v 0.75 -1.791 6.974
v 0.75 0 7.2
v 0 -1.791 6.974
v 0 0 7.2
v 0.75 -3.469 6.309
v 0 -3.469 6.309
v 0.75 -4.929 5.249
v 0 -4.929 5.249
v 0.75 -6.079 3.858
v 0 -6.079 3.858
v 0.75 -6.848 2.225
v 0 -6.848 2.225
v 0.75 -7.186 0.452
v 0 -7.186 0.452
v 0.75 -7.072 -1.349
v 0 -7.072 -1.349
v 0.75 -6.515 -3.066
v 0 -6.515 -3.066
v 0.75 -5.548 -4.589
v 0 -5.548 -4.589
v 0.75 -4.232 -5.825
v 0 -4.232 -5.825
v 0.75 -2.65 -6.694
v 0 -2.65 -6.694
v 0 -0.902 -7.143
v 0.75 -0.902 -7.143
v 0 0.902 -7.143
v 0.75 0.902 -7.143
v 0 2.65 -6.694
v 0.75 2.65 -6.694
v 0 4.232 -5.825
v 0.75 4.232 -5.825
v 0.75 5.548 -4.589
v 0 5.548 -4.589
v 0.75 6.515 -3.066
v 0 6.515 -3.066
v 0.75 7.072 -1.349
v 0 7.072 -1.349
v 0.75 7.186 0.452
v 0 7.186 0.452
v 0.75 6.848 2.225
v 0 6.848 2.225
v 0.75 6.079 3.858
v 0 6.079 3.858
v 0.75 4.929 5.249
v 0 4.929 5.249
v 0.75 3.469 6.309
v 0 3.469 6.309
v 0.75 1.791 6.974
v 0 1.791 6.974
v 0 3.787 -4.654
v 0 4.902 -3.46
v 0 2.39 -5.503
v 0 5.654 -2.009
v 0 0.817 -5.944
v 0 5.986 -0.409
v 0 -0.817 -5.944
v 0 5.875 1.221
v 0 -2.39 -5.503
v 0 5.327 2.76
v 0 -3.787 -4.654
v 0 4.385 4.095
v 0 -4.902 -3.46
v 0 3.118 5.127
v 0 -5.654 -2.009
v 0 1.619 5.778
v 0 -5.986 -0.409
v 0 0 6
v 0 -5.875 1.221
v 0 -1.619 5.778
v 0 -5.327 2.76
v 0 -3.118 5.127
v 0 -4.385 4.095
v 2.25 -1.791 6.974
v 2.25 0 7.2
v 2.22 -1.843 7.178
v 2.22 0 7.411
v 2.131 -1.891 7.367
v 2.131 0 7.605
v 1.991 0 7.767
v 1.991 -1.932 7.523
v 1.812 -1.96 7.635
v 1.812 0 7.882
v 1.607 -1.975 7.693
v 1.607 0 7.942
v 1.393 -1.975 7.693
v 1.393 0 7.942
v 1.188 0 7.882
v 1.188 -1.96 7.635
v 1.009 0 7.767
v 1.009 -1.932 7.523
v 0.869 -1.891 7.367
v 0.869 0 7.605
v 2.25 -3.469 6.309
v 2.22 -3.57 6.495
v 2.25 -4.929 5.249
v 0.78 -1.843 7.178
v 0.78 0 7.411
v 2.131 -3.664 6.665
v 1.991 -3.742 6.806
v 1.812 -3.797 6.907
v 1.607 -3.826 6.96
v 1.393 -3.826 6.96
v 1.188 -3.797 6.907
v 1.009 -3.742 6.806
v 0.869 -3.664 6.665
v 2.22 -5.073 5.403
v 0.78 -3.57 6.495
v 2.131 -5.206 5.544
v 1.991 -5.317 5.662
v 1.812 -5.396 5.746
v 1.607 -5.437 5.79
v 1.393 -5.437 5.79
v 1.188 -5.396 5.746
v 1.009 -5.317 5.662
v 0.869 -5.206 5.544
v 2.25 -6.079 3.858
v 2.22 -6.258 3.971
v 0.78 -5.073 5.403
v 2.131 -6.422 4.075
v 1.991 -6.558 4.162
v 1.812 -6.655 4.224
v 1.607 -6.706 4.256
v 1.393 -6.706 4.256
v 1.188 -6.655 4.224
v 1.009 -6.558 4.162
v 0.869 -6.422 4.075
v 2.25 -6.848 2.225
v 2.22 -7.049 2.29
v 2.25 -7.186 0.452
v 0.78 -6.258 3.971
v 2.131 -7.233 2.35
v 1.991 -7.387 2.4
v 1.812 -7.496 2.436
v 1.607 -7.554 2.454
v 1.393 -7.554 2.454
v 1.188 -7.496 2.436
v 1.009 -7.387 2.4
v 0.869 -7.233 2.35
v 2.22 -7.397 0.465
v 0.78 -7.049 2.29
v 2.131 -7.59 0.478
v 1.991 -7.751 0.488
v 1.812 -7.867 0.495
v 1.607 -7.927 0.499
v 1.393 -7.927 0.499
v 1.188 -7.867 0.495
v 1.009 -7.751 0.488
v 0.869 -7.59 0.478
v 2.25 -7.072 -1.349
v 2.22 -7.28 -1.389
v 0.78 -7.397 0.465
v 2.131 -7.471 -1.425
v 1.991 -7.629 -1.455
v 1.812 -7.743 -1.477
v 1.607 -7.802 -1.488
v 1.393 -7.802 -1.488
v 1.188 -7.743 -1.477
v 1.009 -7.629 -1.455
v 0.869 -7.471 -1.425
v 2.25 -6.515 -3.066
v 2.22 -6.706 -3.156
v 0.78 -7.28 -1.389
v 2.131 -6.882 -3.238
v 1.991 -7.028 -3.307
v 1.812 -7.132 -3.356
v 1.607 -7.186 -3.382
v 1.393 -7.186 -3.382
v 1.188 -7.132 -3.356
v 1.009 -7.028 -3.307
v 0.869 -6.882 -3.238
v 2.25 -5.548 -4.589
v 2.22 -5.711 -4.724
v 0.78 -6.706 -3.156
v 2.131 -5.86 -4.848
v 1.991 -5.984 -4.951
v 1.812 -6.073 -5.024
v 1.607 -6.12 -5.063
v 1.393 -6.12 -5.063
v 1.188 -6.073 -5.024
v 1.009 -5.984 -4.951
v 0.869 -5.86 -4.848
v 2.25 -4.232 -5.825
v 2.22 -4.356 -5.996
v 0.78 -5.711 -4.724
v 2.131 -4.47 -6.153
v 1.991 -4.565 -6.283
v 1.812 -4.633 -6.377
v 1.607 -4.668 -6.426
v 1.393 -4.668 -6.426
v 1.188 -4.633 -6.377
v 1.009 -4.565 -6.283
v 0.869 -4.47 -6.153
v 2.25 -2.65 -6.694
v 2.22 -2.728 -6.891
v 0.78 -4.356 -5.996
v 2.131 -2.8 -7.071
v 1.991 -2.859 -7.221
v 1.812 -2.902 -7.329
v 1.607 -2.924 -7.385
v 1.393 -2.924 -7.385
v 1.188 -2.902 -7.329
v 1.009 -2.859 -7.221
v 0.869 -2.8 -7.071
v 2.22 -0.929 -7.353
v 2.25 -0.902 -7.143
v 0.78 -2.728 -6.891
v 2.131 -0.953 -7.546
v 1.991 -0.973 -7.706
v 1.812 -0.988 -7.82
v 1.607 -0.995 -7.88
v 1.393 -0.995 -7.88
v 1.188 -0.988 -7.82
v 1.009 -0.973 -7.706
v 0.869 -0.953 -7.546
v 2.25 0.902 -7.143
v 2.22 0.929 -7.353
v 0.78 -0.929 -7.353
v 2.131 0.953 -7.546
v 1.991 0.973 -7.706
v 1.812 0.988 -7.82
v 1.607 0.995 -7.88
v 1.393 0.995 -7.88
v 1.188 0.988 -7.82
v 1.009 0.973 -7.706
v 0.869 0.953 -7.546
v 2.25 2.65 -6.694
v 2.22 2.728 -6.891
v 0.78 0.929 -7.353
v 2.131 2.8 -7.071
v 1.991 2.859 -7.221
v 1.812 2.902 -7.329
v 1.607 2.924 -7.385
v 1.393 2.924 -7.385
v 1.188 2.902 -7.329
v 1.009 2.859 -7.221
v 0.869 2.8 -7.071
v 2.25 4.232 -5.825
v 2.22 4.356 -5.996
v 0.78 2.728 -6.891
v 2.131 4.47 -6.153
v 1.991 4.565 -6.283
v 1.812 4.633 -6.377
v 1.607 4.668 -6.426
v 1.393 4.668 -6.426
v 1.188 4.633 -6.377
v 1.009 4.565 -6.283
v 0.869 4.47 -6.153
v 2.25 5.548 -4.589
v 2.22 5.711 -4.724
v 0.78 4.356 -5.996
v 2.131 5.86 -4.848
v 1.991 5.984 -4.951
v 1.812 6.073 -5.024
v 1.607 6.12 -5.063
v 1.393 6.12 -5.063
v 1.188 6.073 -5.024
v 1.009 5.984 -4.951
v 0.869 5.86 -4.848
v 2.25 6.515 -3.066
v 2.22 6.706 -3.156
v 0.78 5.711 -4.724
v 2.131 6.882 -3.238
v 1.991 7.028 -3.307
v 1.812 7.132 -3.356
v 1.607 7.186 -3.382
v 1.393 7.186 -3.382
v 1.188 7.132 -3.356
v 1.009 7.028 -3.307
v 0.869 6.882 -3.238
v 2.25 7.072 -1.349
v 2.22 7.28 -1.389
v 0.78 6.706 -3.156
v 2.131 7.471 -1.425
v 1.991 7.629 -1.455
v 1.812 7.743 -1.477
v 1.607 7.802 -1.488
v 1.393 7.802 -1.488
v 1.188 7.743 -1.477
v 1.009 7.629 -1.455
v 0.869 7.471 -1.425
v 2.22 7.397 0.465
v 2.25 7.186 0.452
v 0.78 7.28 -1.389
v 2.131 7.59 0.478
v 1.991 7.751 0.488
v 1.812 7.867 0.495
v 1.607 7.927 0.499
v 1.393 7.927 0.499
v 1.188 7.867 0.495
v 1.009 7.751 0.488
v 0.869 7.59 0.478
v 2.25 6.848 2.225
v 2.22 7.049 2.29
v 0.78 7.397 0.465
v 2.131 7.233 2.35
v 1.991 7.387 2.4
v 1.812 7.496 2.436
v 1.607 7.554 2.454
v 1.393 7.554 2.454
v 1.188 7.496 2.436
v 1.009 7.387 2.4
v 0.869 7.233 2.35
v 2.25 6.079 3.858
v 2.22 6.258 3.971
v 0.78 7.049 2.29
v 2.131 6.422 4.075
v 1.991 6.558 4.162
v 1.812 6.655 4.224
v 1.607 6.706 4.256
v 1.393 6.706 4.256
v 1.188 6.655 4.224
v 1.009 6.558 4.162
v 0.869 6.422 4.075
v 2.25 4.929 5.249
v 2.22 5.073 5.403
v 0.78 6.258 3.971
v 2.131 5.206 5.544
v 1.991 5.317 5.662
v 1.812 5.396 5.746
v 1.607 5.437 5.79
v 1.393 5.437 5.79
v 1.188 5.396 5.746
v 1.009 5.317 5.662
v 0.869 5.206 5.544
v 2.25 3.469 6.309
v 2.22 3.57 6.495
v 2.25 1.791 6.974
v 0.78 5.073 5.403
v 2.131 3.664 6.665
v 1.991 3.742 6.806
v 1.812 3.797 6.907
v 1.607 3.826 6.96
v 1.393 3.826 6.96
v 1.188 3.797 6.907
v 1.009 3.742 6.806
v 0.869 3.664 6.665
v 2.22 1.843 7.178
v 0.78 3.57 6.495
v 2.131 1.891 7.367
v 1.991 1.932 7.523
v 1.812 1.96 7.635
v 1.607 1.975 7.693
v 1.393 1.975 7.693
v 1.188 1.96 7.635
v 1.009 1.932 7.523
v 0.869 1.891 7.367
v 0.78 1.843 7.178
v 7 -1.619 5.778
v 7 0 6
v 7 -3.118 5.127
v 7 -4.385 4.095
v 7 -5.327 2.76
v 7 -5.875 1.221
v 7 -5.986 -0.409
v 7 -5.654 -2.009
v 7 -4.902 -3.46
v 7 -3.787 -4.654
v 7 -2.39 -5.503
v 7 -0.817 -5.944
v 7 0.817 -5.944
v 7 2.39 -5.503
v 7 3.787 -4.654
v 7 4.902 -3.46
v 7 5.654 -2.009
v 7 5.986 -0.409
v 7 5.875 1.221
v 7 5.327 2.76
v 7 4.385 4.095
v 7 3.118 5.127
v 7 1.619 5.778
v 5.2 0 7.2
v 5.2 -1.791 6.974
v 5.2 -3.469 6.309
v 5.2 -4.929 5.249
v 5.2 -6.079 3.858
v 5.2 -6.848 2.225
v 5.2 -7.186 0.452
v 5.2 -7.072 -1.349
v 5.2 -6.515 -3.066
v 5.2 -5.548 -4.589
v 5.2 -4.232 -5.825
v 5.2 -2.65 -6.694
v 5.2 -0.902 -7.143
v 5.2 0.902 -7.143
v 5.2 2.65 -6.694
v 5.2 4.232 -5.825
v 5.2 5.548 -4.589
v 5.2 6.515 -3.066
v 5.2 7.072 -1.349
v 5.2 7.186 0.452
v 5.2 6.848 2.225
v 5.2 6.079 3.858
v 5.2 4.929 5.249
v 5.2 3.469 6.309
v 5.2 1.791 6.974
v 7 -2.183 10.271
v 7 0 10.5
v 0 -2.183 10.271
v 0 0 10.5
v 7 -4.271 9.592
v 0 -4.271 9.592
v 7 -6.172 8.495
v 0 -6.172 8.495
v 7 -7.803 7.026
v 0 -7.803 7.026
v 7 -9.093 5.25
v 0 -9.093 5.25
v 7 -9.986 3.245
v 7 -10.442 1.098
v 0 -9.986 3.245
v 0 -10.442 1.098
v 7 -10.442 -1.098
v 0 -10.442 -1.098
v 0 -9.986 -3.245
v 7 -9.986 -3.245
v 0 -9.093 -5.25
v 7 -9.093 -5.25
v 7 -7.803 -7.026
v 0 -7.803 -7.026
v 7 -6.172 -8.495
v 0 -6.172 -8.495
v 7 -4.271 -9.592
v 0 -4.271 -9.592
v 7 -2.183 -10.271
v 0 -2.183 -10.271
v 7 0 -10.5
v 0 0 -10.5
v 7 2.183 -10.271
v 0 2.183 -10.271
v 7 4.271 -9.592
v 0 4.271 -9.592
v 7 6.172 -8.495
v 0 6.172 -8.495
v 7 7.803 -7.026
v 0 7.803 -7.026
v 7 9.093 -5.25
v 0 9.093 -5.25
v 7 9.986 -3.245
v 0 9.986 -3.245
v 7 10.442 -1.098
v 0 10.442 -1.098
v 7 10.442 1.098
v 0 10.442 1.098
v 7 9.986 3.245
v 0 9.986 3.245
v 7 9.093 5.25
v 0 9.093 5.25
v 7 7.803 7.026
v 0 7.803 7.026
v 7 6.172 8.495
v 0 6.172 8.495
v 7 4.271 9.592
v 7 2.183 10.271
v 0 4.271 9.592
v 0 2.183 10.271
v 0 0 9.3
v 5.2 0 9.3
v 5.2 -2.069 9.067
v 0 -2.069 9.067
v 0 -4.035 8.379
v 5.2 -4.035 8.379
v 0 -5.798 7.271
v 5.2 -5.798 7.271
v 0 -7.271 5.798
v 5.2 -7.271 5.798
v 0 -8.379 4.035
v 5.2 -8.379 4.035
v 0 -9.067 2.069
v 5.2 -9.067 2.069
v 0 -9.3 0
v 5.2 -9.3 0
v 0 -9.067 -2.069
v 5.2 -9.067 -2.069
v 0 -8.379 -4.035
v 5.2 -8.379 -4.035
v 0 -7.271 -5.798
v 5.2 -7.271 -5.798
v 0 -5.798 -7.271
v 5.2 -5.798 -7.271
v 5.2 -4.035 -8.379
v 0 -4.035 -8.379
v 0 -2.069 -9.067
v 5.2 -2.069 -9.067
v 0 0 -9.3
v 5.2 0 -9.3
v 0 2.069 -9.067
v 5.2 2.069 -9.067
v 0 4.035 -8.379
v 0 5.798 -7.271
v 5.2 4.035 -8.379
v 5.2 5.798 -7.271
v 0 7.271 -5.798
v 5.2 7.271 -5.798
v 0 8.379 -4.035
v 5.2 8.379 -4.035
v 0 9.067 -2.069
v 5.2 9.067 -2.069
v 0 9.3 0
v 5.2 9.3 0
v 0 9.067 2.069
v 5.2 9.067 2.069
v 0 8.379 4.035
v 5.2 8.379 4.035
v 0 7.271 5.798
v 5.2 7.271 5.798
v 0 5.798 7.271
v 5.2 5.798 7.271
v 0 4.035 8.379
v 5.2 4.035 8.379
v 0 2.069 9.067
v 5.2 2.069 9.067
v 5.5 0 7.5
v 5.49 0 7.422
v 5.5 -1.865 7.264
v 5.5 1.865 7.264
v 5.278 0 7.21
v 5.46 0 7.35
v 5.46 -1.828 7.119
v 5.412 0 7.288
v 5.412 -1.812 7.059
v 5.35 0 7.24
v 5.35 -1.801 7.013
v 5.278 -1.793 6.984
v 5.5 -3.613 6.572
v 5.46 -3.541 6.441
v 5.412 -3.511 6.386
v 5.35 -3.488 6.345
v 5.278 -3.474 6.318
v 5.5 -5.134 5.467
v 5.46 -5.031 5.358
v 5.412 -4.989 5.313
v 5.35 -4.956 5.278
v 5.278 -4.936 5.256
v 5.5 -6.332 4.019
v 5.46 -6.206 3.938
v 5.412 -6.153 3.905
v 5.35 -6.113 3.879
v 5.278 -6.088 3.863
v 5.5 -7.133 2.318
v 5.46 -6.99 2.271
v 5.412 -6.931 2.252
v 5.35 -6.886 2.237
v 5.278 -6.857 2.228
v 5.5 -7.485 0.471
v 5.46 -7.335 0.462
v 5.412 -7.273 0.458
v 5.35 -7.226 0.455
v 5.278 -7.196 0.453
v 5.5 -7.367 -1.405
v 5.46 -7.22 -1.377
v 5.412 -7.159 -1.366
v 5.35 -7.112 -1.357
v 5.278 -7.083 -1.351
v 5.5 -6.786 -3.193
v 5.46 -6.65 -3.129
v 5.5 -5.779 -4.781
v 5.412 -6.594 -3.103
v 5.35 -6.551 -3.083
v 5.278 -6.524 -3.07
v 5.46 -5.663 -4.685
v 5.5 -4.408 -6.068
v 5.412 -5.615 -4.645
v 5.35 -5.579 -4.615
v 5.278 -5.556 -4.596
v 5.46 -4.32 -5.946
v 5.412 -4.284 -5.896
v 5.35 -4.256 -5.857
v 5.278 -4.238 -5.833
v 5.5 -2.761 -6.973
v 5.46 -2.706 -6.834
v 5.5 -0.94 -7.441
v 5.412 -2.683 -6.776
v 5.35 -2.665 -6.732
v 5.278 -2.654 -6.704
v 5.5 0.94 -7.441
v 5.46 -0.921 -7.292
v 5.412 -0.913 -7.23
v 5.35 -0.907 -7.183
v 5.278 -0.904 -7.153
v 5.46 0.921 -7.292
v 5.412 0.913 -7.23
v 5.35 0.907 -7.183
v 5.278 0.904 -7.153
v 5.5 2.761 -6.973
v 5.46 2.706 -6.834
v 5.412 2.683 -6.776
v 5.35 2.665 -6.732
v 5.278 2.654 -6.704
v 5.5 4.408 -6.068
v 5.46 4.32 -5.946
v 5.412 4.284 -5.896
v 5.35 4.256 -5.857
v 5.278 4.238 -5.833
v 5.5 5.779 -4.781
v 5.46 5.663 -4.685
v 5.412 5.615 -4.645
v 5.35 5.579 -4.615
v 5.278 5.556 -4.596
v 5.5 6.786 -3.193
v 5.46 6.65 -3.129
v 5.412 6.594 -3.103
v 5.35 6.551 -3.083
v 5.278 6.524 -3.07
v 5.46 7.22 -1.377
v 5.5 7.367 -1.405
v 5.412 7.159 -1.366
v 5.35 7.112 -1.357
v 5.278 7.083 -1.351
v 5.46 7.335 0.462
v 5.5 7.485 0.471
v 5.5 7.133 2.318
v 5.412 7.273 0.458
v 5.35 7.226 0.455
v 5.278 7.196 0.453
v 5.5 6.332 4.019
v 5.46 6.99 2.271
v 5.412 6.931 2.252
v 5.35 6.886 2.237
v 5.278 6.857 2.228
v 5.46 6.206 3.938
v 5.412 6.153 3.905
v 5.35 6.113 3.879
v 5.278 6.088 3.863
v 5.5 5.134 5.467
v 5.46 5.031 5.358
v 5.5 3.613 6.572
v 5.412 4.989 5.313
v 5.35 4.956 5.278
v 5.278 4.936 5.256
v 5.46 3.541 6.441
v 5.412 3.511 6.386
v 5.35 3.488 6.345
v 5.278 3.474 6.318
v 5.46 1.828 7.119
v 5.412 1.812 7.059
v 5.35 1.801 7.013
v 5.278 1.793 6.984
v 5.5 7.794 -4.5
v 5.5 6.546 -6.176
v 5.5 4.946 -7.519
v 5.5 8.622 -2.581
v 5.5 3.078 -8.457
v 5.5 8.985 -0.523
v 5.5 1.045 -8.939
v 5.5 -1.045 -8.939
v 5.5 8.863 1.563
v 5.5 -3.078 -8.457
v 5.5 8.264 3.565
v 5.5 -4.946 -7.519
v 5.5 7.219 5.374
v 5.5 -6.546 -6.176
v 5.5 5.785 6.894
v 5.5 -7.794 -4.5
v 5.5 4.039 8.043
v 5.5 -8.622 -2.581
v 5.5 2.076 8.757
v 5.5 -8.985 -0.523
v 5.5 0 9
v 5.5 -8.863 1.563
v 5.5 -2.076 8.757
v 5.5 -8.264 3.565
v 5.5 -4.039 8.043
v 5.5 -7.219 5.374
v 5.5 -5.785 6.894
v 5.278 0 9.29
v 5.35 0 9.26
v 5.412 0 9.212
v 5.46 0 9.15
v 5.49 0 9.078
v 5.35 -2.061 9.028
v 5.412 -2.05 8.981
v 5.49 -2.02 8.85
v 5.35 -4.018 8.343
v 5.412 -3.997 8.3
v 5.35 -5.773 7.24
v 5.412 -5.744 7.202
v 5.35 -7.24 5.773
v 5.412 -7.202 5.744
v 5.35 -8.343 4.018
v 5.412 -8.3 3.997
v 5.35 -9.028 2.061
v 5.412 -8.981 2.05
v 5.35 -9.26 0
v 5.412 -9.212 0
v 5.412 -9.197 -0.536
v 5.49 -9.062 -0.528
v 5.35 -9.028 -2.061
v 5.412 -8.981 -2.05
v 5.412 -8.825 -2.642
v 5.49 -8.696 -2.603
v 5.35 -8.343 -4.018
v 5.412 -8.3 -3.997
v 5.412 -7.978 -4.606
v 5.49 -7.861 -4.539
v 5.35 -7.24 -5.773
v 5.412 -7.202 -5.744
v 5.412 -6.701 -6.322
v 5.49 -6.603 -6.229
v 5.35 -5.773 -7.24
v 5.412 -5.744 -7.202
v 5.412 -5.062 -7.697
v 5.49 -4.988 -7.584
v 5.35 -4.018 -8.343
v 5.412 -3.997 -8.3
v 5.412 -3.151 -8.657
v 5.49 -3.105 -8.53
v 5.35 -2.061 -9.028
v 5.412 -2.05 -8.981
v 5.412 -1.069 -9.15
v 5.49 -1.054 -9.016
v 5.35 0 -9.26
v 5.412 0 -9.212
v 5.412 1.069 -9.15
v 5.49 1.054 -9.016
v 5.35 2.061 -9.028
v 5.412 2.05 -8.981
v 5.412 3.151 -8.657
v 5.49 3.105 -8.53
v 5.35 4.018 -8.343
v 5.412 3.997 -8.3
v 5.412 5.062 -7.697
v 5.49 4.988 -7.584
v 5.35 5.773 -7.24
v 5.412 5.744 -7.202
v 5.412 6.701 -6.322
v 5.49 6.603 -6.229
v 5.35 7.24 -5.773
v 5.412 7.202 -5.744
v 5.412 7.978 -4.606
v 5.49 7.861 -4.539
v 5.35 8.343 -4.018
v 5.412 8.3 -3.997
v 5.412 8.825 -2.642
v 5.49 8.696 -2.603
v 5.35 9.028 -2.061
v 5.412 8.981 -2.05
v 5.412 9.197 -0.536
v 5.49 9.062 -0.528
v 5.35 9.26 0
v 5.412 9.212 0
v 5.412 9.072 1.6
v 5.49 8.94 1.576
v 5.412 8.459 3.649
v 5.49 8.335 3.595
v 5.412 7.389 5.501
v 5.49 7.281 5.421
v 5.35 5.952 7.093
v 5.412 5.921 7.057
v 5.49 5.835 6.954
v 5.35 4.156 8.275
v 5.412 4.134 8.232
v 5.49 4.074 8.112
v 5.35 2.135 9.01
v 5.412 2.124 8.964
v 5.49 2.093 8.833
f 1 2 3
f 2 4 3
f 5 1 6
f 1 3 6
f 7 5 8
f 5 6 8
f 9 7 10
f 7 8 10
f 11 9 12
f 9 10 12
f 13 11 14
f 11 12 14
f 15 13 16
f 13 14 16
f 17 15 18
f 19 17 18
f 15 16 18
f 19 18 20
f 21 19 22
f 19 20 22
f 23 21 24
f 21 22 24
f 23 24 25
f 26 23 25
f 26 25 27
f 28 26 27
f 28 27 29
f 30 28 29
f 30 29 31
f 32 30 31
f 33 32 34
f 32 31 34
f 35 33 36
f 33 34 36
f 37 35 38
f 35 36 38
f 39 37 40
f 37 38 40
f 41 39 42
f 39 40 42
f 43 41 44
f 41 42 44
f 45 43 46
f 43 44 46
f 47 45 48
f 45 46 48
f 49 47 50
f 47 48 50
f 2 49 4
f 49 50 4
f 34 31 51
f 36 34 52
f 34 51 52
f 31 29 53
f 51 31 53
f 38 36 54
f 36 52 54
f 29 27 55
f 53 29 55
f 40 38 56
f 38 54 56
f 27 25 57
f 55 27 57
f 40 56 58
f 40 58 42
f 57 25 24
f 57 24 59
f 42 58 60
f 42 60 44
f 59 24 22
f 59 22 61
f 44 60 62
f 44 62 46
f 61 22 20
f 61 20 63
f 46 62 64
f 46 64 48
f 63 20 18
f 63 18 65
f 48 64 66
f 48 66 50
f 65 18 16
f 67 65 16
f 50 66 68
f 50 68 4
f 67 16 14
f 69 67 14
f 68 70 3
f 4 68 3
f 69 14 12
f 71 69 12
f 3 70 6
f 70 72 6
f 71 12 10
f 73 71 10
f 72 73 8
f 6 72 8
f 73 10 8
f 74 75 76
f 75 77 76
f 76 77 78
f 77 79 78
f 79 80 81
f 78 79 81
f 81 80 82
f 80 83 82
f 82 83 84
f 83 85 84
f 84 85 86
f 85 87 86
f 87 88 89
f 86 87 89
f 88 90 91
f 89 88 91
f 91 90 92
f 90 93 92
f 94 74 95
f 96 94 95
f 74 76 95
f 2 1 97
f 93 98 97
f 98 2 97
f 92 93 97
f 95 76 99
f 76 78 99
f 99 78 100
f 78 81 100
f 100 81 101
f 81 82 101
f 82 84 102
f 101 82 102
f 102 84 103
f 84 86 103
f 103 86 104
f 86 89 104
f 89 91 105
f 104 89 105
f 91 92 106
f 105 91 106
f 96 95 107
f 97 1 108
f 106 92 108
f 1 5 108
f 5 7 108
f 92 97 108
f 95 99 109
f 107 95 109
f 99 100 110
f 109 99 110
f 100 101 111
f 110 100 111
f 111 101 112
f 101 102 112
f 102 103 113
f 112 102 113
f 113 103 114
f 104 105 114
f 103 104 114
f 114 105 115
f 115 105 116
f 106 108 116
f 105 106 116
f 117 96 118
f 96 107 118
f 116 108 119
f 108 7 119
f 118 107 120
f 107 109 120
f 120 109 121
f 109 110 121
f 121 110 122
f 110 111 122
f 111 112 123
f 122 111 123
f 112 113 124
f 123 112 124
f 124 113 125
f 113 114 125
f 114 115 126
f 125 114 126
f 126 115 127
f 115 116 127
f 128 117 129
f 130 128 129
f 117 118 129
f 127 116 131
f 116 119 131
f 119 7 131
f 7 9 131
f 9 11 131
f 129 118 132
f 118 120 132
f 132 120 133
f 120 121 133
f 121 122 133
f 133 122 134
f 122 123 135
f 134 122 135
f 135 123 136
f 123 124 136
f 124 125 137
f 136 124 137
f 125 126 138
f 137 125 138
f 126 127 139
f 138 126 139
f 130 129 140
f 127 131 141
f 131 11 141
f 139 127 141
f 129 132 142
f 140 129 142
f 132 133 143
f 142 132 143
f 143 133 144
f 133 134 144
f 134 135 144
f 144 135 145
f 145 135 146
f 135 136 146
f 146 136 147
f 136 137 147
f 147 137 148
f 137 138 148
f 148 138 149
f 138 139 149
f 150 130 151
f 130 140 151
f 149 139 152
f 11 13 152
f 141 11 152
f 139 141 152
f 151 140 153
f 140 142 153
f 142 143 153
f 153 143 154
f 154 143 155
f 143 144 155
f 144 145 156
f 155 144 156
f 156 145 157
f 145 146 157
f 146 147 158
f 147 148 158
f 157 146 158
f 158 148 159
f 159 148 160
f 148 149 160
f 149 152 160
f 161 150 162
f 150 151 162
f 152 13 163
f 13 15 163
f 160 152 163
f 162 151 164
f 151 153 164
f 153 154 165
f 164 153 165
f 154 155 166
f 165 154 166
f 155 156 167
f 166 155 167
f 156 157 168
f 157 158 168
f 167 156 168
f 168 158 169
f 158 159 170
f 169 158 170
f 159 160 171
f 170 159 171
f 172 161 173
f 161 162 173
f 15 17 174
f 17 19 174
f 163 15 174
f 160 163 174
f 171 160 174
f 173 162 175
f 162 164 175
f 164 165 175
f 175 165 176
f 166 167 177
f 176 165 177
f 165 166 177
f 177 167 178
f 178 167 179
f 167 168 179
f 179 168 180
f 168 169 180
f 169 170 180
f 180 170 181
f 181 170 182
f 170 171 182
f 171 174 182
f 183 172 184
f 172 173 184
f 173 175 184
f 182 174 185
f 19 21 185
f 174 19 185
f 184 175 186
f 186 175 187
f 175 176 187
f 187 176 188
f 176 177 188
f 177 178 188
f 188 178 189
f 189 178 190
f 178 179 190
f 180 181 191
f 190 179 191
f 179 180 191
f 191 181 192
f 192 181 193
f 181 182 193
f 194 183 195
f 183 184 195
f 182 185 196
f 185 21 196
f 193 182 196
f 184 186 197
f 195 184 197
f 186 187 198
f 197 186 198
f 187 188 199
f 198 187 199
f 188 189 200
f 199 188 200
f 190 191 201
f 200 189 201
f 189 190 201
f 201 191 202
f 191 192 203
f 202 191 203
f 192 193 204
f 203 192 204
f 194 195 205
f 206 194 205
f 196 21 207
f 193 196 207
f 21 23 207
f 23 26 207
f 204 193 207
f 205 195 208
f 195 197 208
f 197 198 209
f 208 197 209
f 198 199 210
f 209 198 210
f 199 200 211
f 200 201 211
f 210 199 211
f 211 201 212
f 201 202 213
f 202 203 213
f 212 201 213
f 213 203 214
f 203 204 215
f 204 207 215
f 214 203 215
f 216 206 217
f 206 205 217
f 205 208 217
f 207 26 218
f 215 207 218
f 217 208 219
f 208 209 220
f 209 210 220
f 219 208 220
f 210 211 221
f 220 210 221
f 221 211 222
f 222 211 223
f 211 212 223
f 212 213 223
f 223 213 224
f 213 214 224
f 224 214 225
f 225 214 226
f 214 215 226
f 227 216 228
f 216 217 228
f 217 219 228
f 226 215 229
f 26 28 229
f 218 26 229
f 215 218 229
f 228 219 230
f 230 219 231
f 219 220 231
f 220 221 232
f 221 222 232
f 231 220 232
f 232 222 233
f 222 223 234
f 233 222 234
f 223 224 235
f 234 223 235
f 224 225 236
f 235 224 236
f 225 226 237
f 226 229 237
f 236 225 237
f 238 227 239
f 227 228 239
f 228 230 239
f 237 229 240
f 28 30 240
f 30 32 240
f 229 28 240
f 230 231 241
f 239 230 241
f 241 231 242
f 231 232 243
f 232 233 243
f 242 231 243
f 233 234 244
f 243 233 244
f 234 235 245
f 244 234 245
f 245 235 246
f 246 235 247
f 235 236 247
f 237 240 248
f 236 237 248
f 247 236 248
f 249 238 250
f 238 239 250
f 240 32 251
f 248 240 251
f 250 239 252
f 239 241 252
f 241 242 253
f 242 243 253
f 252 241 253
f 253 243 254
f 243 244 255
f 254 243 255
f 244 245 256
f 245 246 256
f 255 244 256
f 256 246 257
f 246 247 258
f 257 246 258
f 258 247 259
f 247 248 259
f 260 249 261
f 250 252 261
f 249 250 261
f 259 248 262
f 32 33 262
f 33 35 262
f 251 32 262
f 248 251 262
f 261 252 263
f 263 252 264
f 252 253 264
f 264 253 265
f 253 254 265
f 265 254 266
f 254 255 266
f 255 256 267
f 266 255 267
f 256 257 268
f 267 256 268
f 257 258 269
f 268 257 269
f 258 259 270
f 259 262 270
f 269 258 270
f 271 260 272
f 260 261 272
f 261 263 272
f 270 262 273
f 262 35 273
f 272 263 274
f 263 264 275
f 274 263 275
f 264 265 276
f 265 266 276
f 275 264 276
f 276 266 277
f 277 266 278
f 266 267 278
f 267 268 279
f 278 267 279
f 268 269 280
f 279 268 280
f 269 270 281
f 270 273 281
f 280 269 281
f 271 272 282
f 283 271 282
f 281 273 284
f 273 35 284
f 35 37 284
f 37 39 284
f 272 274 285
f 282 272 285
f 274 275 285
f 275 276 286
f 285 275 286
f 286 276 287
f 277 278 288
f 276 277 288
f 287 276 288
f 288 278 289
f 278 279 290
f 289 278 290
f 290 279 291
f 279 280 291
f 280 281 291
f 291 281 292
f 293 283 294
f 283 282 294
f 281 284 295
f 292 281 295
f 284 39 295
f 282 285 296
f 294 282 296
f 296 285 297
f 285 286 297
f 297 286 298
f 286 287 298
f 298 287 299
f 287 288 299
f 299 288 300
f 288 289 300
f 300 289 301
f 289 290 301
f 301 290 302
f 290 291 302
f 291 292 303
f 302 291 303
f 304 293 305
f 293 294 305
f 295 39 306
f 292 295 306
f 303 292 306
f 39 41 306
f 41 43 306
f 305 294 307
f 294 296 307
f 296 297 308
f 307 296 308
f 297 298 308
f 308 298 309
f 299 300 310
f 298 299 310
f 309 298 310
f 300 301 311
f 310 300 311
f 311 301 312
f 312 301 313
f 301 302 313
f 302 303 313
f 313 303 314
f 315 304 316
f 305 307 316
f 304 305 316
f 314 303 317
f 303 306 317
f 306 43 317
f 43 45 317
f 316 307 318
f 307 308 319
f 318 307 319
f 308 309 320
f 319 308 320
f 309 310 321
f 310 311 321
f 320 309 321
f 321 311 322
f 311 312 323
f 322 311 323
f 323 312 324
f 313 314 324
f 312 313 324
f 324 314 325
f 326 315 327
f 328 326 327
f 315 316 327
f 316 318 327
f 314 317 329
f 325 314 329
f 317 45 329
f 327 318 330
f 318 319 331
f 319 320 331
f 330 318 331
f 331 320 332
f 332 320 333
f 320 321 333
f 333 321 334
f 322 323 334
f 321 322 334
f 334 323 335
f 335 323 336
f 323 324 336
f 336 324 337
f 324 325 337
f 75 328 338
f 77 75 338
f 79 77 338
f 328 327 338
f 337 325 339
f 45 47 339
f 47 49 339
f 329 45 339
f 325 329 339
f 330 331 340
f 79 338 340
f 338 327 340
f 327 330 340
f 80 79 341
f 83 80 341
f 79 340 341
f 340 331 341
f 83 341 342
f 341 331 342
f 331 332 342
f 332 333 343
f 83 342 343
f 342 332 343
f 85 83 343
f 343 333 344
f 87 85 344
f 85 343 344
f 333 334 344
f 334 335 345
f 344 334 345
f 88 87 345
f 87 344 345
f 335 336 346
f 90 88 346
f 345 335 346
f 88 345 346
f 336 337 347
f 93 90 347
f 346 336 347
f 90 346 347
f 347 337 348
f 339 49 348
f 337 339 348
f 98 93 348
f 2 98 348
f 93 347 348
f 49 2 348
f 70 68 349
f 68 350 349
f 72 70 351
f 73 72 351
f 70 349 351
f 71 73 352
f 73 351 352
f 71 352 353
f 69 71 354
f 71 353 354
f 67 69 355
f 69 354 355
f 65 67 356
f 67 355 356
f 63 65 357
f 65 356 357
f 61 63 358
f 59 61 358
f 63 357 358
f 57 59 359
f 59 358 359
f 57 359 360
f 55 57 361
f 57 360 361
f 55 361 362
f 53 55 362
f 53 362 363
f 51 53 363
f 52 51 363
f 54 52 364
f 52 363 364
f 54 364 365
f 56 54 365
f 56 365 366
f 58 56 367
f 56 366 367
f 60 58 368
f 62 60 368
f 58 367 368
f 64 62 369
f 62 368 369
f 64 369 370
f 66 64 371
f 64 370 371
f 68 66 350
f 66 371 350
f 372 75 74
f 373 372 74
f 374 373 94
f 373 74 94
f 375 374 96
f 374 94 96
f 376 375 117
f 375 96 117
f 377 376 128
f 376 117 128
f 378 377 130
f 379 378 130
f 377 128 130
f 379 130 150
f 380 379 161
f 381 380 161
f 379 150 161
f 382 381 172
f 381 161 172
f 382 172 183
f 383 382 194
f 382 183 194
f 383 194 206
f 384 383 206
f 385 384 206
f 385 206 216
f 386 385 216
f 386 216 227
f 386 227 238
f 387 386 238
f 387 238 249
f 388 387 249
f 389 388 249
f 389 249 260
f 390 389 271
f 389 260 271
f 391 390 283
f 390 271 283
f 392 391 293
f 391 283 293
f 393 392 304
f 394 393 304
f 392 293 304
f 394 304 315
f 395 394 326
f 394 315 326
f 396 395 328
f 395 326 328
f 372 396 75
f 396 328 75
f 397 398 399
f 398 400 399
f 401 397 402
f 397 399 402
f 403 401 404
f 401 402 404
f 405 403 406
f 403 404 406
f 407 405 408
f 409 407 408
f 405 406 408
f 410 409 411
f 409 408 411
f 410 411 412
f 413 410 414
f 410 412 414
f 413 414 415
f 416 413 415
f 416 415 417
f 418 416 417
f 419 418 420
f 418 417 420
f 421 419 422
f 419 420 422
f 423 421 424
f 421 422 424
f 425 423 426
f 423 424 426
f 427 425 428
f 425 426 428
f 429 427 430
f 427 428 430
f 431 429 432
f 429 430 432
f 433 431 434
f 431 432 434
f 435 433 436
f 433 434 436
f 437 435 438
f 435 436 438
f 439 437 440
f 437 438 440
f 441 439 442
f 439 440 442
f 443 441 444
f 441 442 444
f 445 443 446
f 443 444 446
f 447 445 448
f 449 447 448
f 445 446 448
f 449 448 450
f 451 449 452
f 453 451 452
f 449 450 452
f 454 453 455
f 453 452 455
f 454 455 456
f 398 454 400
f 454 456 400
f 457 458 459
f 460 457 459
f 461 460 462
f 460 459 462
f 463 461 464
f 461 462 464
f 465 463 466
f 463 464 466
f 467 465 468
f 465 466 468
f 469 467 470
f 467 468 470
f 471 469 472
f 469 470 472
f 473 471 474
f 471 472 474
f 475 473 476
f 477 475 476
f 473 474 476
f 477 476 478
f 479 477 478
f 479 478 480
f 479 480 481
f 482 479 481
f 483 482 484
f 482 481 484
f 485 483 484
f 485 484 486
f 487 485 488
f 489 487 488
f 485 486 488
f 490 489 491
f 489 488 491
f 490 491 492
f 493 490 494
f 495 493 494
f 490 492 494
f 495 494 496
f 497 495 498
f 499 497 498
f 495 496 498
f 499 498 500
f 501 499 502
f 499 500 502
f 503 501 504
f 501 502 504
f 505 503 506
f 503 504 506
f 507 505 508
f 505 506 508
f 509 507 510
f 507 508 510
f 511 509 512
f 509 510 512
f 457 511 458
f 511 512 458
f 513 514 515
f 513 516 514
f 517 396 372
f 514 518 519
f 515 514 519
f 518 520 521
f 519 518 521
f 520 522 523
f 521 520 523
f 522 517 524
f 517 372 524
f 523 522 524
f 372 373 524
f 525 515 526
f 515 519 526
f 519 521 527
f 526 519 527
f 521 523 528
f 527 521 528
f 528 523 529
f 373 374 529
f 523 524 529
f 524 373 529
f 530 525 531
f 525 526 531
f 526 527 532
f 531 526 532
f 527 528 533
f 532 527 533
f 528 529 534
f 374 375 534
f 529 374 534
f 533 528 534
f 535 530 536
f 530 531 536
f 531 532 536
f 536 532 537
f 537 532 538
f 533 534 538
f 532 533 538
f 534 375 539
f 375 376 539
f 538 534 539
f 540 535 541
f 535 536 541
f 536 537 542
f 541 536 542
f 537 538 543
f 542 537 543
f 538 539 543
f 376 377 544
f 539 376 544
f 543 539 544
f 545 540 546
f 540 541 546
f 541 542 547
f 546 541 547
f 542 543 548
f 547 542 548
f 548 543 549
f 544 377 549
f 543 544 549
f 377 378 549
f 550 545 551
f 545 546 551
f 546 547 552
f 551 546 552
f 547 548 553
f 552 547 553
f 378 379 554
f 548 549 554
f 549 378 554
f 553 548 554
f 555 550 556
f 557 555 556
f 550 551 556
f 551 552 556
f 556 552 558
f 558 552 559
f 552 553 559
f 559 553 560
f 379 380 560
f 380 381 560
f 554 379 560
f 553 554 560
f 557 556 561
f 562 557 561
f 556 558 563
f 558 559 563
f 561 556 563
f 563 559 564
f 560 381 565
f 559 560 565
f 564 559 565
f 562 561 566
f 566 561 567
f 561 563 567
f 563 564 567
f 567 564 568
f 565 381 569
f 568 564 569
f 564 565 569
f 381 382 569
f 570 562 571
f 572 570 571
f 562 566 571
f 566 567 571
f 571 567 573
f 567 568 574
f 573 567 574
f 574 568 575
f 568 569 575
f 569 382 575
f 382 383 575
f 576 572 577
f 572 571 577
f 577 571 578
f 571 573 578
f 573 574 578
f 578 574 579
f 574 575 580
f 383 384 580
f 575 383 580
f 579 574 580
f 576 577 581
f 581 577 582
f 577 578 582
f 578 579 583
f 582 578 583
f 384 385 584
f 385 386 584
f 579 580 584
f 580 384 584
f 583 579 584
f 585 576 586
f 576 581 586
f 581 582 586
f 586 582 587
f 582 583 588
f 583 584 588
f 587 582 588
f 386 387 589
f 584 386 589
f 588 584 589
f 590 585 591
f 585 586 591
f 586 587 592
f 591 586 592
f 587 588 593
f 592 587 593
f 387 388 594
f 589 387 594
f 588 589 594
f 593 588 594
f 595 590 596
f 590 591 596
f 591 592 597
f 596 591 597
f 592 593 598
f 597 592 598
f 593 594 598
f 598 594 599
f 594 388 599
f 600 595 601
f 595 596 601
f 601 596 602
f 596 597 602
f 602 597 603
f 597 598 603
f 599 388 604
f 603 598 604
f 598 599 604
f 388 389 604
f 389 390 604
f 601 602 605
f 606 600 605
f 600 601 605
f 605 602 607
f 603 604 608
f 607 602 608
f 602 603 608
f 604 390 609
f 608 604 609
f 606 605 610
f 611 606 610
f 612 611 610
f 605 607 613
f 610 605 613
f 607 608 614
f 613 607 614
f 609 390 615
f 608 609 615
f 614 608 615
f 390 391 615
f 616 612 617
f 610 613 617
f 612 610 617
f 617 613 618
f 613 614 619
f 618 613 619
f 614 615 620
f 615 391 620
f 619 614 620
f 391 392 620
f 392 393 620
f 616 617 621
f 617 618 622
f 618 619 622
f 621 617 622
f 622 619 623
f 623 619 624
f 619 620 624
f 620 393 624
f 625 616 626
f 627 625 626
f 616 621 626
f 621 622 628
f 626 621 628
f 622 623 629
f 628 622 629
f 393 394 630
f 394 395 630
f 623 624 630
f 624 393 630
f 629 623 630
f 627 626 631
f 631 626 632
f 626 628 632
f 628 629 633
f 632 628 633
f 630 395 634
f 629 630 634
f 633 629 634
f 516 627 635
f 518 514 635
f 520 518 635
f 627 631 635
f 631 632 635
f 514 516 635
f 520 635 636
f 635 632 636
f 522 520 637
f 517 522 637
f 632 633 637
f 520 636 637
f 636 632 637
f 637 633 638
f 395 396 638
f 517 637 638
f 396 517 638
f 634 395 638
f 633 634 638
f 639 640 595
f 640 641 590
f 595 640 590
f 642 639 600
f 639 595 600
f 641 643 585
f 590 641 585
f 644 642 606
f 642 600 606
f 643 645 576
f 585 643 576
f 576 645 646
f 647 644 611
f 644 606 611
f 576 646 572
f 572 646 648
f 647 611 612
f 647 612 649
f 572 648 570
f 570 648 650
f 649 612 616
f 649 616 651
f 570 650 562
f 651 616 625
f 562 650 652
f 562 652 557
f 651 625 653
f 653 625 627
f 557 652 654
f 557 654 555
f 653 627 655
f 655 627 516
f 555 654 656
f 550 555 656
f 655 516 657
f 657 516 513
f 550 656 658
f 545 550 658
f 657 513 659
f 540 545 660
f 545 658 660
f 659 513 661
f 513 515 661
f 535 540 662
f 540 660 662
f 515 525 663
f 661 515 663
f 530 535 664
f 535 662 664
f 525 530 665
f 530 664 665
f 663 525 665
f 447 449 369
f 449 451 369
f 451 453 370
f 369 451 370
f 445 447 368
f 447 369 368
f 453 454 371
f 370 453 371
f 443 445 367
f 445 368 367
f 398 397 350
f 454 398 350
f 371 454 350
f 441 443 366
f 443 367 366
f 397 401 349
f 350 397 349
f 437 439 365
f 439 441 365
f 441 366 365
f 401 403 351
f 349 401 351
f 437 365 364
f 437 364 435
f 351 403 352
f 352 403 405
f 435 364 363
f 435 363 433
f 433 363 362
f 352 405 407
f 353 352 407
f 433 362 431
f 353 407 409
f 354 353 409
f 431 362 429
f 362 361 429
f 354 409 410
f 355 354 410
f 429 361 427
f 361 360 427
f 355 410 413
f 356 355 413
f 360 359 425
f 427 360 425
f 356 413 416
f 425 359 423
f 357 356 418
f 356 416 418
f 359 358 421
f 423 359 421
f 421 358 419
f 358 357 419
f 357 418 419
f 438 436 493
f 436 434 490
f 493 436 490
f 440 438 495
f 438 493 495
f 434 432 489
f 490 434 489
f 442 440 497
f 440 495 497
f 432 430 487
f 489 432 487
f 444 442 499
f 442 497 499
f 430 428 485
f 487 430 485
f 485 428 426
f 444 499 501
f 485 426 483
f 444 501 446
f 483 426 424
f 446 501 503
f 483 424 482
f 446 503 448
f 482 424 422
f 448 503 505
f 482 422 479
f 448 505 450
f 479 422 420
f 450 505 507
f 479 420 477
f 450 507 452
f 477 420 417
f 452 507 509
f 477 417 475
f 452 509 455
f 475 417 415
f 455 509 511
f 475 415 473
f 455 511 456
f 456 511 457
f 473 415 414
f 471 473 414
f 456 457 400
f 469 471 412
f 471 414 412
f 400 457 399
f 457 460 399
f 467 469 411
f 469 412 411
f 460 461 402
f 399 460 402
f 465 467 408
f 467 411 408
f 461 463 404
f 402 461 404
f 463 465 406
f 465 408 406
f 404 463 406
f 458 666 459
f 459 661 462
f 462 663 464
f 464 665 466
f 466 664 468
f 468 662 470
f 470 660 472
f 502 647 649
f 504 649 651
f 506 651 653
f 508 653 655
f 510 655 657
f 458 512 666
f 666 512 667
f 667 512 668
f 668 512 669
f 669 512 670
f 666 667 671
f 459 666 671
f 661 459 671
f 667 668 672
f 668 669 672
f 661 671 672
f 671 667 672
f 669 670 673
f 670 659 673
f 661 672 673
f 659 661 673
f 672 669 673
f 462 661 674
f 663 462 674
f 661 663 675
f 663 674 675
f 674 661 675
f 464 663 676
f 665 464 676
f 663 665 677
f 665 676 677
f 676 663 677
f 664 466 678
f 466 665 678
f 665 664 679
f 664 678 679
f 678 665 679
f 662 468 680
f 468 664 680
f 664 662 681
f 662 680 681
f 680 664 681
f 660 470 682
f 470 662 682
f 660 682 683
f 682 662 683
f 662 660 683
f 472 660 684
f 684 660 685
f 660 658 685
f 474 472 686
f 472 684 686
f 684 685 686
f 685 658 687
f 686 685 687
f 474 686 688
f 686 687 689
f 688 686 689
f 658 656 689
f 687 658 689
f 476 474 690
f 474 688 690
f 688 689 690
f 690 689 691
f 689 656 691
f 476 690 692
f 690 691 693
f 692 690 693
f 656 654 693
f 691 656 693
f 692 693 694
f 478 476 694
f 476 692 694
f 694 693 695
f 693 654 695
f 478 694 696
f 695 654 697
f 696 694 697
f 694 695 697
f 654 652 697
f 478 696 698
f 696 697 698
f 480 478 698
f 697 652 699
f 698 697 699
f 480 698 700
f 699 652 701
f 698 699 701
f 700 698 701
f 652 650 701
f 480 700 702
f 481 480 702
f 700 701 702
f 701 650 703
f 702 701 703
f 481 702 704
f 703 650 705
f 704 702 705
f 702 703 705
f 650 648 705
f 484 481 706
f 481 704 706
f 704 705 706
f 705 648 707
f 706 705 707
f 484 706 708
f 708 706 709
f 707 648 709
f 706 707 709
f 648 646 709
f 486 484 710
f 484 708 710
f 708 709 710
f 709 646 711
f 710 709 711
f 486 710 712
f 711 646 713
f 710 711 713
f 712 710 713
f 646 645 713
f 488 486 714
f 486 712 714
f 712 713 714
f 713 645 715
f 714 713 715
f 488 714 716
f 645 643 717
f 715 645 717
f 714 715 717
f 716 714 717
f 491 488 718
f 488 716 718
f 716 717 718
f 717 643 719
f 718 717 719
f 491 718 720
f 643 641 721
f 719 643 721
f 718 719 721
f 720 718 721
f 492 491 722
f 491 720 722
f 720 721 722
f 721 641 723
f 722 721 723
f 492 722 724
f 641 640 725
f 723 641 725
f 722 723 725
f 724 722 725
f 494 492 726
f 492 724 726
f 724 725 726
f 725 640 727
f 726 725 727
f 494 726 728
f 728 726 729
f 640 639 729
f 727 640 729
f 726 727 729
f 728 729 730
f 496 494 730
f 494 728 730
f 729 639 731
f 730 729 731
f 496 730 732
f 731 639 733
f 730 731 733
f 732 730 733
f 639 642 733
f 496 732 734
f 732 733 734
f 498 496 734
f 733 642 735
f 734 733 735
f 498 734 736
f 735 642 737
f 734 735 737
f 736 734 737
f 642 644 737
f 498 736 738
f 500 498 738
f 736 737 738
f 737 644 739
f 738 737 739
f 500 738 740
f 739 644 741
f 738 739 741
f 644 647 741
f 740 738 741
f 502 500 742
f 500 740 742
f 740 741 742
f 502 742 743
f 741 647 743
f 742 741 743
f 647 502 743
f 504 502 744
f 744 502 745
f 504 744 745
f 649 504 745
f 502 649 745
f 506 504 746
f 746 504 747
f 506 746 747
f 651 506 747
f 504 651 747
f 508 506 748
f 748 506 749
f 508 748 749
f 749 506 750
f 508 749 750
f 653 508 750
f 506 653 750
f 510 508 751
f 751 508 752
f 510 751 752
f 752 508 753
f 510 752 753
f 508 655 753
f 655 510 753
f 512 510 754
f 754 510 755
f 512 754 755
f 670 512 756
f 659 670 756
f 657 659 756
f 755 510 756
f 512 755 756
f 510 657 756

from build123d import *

# Parameters (mm, degrees)
SKETCH_2_R = 0.75
FILLET_1_R = 0.3


with BuildPart() as part:
    # 草图2 → 旋转1 (revolve)
    with BuildSketch(Plane.XY, mode=Mode.PRIVATE) as revolve_1_sk:
        with BuildLine():
            ThreePointArc((2.25, 7.2), (1.5, 7.95), (0.75, 7.2))
            Line((0.75, 7.2), (2.25, 7.2))
        make_face()
        with BuildLine():
            Line((2.25, 7.2), (0.75, 7.2))
            ThreePointArc((0.75, 7.2), (1.5, 6.45), (2.25, 7.2))
        make_face()
        with Locations((1.5, 7.2)):
            Circle(SKETCH_2_R)
        Polygon((5.5, 7.2), (0, 7.2), (0, 6), (7, 6), (7, 10.5), (0, 10.5), (0, 9.3), (5.5, 9.3), align=None)
    revolve(revolve_1_sk.sketch.rotate(Axis((-18.653285905, 0, 0), (1, 0, 0)), 90), axis=Axis((-18.653285905, 0, 0), (1, 0, 0)))

    # 圆角1
    fillet_1_edges = [part.edges().sort_by_distance(p)[0] for p in [
        (5.5, 0, -7.2),
        (5.5, 0, -9.3),
    ]]
    fillet(fillet_1_edges, radius=FILLET_1_R)


solid = part.part
